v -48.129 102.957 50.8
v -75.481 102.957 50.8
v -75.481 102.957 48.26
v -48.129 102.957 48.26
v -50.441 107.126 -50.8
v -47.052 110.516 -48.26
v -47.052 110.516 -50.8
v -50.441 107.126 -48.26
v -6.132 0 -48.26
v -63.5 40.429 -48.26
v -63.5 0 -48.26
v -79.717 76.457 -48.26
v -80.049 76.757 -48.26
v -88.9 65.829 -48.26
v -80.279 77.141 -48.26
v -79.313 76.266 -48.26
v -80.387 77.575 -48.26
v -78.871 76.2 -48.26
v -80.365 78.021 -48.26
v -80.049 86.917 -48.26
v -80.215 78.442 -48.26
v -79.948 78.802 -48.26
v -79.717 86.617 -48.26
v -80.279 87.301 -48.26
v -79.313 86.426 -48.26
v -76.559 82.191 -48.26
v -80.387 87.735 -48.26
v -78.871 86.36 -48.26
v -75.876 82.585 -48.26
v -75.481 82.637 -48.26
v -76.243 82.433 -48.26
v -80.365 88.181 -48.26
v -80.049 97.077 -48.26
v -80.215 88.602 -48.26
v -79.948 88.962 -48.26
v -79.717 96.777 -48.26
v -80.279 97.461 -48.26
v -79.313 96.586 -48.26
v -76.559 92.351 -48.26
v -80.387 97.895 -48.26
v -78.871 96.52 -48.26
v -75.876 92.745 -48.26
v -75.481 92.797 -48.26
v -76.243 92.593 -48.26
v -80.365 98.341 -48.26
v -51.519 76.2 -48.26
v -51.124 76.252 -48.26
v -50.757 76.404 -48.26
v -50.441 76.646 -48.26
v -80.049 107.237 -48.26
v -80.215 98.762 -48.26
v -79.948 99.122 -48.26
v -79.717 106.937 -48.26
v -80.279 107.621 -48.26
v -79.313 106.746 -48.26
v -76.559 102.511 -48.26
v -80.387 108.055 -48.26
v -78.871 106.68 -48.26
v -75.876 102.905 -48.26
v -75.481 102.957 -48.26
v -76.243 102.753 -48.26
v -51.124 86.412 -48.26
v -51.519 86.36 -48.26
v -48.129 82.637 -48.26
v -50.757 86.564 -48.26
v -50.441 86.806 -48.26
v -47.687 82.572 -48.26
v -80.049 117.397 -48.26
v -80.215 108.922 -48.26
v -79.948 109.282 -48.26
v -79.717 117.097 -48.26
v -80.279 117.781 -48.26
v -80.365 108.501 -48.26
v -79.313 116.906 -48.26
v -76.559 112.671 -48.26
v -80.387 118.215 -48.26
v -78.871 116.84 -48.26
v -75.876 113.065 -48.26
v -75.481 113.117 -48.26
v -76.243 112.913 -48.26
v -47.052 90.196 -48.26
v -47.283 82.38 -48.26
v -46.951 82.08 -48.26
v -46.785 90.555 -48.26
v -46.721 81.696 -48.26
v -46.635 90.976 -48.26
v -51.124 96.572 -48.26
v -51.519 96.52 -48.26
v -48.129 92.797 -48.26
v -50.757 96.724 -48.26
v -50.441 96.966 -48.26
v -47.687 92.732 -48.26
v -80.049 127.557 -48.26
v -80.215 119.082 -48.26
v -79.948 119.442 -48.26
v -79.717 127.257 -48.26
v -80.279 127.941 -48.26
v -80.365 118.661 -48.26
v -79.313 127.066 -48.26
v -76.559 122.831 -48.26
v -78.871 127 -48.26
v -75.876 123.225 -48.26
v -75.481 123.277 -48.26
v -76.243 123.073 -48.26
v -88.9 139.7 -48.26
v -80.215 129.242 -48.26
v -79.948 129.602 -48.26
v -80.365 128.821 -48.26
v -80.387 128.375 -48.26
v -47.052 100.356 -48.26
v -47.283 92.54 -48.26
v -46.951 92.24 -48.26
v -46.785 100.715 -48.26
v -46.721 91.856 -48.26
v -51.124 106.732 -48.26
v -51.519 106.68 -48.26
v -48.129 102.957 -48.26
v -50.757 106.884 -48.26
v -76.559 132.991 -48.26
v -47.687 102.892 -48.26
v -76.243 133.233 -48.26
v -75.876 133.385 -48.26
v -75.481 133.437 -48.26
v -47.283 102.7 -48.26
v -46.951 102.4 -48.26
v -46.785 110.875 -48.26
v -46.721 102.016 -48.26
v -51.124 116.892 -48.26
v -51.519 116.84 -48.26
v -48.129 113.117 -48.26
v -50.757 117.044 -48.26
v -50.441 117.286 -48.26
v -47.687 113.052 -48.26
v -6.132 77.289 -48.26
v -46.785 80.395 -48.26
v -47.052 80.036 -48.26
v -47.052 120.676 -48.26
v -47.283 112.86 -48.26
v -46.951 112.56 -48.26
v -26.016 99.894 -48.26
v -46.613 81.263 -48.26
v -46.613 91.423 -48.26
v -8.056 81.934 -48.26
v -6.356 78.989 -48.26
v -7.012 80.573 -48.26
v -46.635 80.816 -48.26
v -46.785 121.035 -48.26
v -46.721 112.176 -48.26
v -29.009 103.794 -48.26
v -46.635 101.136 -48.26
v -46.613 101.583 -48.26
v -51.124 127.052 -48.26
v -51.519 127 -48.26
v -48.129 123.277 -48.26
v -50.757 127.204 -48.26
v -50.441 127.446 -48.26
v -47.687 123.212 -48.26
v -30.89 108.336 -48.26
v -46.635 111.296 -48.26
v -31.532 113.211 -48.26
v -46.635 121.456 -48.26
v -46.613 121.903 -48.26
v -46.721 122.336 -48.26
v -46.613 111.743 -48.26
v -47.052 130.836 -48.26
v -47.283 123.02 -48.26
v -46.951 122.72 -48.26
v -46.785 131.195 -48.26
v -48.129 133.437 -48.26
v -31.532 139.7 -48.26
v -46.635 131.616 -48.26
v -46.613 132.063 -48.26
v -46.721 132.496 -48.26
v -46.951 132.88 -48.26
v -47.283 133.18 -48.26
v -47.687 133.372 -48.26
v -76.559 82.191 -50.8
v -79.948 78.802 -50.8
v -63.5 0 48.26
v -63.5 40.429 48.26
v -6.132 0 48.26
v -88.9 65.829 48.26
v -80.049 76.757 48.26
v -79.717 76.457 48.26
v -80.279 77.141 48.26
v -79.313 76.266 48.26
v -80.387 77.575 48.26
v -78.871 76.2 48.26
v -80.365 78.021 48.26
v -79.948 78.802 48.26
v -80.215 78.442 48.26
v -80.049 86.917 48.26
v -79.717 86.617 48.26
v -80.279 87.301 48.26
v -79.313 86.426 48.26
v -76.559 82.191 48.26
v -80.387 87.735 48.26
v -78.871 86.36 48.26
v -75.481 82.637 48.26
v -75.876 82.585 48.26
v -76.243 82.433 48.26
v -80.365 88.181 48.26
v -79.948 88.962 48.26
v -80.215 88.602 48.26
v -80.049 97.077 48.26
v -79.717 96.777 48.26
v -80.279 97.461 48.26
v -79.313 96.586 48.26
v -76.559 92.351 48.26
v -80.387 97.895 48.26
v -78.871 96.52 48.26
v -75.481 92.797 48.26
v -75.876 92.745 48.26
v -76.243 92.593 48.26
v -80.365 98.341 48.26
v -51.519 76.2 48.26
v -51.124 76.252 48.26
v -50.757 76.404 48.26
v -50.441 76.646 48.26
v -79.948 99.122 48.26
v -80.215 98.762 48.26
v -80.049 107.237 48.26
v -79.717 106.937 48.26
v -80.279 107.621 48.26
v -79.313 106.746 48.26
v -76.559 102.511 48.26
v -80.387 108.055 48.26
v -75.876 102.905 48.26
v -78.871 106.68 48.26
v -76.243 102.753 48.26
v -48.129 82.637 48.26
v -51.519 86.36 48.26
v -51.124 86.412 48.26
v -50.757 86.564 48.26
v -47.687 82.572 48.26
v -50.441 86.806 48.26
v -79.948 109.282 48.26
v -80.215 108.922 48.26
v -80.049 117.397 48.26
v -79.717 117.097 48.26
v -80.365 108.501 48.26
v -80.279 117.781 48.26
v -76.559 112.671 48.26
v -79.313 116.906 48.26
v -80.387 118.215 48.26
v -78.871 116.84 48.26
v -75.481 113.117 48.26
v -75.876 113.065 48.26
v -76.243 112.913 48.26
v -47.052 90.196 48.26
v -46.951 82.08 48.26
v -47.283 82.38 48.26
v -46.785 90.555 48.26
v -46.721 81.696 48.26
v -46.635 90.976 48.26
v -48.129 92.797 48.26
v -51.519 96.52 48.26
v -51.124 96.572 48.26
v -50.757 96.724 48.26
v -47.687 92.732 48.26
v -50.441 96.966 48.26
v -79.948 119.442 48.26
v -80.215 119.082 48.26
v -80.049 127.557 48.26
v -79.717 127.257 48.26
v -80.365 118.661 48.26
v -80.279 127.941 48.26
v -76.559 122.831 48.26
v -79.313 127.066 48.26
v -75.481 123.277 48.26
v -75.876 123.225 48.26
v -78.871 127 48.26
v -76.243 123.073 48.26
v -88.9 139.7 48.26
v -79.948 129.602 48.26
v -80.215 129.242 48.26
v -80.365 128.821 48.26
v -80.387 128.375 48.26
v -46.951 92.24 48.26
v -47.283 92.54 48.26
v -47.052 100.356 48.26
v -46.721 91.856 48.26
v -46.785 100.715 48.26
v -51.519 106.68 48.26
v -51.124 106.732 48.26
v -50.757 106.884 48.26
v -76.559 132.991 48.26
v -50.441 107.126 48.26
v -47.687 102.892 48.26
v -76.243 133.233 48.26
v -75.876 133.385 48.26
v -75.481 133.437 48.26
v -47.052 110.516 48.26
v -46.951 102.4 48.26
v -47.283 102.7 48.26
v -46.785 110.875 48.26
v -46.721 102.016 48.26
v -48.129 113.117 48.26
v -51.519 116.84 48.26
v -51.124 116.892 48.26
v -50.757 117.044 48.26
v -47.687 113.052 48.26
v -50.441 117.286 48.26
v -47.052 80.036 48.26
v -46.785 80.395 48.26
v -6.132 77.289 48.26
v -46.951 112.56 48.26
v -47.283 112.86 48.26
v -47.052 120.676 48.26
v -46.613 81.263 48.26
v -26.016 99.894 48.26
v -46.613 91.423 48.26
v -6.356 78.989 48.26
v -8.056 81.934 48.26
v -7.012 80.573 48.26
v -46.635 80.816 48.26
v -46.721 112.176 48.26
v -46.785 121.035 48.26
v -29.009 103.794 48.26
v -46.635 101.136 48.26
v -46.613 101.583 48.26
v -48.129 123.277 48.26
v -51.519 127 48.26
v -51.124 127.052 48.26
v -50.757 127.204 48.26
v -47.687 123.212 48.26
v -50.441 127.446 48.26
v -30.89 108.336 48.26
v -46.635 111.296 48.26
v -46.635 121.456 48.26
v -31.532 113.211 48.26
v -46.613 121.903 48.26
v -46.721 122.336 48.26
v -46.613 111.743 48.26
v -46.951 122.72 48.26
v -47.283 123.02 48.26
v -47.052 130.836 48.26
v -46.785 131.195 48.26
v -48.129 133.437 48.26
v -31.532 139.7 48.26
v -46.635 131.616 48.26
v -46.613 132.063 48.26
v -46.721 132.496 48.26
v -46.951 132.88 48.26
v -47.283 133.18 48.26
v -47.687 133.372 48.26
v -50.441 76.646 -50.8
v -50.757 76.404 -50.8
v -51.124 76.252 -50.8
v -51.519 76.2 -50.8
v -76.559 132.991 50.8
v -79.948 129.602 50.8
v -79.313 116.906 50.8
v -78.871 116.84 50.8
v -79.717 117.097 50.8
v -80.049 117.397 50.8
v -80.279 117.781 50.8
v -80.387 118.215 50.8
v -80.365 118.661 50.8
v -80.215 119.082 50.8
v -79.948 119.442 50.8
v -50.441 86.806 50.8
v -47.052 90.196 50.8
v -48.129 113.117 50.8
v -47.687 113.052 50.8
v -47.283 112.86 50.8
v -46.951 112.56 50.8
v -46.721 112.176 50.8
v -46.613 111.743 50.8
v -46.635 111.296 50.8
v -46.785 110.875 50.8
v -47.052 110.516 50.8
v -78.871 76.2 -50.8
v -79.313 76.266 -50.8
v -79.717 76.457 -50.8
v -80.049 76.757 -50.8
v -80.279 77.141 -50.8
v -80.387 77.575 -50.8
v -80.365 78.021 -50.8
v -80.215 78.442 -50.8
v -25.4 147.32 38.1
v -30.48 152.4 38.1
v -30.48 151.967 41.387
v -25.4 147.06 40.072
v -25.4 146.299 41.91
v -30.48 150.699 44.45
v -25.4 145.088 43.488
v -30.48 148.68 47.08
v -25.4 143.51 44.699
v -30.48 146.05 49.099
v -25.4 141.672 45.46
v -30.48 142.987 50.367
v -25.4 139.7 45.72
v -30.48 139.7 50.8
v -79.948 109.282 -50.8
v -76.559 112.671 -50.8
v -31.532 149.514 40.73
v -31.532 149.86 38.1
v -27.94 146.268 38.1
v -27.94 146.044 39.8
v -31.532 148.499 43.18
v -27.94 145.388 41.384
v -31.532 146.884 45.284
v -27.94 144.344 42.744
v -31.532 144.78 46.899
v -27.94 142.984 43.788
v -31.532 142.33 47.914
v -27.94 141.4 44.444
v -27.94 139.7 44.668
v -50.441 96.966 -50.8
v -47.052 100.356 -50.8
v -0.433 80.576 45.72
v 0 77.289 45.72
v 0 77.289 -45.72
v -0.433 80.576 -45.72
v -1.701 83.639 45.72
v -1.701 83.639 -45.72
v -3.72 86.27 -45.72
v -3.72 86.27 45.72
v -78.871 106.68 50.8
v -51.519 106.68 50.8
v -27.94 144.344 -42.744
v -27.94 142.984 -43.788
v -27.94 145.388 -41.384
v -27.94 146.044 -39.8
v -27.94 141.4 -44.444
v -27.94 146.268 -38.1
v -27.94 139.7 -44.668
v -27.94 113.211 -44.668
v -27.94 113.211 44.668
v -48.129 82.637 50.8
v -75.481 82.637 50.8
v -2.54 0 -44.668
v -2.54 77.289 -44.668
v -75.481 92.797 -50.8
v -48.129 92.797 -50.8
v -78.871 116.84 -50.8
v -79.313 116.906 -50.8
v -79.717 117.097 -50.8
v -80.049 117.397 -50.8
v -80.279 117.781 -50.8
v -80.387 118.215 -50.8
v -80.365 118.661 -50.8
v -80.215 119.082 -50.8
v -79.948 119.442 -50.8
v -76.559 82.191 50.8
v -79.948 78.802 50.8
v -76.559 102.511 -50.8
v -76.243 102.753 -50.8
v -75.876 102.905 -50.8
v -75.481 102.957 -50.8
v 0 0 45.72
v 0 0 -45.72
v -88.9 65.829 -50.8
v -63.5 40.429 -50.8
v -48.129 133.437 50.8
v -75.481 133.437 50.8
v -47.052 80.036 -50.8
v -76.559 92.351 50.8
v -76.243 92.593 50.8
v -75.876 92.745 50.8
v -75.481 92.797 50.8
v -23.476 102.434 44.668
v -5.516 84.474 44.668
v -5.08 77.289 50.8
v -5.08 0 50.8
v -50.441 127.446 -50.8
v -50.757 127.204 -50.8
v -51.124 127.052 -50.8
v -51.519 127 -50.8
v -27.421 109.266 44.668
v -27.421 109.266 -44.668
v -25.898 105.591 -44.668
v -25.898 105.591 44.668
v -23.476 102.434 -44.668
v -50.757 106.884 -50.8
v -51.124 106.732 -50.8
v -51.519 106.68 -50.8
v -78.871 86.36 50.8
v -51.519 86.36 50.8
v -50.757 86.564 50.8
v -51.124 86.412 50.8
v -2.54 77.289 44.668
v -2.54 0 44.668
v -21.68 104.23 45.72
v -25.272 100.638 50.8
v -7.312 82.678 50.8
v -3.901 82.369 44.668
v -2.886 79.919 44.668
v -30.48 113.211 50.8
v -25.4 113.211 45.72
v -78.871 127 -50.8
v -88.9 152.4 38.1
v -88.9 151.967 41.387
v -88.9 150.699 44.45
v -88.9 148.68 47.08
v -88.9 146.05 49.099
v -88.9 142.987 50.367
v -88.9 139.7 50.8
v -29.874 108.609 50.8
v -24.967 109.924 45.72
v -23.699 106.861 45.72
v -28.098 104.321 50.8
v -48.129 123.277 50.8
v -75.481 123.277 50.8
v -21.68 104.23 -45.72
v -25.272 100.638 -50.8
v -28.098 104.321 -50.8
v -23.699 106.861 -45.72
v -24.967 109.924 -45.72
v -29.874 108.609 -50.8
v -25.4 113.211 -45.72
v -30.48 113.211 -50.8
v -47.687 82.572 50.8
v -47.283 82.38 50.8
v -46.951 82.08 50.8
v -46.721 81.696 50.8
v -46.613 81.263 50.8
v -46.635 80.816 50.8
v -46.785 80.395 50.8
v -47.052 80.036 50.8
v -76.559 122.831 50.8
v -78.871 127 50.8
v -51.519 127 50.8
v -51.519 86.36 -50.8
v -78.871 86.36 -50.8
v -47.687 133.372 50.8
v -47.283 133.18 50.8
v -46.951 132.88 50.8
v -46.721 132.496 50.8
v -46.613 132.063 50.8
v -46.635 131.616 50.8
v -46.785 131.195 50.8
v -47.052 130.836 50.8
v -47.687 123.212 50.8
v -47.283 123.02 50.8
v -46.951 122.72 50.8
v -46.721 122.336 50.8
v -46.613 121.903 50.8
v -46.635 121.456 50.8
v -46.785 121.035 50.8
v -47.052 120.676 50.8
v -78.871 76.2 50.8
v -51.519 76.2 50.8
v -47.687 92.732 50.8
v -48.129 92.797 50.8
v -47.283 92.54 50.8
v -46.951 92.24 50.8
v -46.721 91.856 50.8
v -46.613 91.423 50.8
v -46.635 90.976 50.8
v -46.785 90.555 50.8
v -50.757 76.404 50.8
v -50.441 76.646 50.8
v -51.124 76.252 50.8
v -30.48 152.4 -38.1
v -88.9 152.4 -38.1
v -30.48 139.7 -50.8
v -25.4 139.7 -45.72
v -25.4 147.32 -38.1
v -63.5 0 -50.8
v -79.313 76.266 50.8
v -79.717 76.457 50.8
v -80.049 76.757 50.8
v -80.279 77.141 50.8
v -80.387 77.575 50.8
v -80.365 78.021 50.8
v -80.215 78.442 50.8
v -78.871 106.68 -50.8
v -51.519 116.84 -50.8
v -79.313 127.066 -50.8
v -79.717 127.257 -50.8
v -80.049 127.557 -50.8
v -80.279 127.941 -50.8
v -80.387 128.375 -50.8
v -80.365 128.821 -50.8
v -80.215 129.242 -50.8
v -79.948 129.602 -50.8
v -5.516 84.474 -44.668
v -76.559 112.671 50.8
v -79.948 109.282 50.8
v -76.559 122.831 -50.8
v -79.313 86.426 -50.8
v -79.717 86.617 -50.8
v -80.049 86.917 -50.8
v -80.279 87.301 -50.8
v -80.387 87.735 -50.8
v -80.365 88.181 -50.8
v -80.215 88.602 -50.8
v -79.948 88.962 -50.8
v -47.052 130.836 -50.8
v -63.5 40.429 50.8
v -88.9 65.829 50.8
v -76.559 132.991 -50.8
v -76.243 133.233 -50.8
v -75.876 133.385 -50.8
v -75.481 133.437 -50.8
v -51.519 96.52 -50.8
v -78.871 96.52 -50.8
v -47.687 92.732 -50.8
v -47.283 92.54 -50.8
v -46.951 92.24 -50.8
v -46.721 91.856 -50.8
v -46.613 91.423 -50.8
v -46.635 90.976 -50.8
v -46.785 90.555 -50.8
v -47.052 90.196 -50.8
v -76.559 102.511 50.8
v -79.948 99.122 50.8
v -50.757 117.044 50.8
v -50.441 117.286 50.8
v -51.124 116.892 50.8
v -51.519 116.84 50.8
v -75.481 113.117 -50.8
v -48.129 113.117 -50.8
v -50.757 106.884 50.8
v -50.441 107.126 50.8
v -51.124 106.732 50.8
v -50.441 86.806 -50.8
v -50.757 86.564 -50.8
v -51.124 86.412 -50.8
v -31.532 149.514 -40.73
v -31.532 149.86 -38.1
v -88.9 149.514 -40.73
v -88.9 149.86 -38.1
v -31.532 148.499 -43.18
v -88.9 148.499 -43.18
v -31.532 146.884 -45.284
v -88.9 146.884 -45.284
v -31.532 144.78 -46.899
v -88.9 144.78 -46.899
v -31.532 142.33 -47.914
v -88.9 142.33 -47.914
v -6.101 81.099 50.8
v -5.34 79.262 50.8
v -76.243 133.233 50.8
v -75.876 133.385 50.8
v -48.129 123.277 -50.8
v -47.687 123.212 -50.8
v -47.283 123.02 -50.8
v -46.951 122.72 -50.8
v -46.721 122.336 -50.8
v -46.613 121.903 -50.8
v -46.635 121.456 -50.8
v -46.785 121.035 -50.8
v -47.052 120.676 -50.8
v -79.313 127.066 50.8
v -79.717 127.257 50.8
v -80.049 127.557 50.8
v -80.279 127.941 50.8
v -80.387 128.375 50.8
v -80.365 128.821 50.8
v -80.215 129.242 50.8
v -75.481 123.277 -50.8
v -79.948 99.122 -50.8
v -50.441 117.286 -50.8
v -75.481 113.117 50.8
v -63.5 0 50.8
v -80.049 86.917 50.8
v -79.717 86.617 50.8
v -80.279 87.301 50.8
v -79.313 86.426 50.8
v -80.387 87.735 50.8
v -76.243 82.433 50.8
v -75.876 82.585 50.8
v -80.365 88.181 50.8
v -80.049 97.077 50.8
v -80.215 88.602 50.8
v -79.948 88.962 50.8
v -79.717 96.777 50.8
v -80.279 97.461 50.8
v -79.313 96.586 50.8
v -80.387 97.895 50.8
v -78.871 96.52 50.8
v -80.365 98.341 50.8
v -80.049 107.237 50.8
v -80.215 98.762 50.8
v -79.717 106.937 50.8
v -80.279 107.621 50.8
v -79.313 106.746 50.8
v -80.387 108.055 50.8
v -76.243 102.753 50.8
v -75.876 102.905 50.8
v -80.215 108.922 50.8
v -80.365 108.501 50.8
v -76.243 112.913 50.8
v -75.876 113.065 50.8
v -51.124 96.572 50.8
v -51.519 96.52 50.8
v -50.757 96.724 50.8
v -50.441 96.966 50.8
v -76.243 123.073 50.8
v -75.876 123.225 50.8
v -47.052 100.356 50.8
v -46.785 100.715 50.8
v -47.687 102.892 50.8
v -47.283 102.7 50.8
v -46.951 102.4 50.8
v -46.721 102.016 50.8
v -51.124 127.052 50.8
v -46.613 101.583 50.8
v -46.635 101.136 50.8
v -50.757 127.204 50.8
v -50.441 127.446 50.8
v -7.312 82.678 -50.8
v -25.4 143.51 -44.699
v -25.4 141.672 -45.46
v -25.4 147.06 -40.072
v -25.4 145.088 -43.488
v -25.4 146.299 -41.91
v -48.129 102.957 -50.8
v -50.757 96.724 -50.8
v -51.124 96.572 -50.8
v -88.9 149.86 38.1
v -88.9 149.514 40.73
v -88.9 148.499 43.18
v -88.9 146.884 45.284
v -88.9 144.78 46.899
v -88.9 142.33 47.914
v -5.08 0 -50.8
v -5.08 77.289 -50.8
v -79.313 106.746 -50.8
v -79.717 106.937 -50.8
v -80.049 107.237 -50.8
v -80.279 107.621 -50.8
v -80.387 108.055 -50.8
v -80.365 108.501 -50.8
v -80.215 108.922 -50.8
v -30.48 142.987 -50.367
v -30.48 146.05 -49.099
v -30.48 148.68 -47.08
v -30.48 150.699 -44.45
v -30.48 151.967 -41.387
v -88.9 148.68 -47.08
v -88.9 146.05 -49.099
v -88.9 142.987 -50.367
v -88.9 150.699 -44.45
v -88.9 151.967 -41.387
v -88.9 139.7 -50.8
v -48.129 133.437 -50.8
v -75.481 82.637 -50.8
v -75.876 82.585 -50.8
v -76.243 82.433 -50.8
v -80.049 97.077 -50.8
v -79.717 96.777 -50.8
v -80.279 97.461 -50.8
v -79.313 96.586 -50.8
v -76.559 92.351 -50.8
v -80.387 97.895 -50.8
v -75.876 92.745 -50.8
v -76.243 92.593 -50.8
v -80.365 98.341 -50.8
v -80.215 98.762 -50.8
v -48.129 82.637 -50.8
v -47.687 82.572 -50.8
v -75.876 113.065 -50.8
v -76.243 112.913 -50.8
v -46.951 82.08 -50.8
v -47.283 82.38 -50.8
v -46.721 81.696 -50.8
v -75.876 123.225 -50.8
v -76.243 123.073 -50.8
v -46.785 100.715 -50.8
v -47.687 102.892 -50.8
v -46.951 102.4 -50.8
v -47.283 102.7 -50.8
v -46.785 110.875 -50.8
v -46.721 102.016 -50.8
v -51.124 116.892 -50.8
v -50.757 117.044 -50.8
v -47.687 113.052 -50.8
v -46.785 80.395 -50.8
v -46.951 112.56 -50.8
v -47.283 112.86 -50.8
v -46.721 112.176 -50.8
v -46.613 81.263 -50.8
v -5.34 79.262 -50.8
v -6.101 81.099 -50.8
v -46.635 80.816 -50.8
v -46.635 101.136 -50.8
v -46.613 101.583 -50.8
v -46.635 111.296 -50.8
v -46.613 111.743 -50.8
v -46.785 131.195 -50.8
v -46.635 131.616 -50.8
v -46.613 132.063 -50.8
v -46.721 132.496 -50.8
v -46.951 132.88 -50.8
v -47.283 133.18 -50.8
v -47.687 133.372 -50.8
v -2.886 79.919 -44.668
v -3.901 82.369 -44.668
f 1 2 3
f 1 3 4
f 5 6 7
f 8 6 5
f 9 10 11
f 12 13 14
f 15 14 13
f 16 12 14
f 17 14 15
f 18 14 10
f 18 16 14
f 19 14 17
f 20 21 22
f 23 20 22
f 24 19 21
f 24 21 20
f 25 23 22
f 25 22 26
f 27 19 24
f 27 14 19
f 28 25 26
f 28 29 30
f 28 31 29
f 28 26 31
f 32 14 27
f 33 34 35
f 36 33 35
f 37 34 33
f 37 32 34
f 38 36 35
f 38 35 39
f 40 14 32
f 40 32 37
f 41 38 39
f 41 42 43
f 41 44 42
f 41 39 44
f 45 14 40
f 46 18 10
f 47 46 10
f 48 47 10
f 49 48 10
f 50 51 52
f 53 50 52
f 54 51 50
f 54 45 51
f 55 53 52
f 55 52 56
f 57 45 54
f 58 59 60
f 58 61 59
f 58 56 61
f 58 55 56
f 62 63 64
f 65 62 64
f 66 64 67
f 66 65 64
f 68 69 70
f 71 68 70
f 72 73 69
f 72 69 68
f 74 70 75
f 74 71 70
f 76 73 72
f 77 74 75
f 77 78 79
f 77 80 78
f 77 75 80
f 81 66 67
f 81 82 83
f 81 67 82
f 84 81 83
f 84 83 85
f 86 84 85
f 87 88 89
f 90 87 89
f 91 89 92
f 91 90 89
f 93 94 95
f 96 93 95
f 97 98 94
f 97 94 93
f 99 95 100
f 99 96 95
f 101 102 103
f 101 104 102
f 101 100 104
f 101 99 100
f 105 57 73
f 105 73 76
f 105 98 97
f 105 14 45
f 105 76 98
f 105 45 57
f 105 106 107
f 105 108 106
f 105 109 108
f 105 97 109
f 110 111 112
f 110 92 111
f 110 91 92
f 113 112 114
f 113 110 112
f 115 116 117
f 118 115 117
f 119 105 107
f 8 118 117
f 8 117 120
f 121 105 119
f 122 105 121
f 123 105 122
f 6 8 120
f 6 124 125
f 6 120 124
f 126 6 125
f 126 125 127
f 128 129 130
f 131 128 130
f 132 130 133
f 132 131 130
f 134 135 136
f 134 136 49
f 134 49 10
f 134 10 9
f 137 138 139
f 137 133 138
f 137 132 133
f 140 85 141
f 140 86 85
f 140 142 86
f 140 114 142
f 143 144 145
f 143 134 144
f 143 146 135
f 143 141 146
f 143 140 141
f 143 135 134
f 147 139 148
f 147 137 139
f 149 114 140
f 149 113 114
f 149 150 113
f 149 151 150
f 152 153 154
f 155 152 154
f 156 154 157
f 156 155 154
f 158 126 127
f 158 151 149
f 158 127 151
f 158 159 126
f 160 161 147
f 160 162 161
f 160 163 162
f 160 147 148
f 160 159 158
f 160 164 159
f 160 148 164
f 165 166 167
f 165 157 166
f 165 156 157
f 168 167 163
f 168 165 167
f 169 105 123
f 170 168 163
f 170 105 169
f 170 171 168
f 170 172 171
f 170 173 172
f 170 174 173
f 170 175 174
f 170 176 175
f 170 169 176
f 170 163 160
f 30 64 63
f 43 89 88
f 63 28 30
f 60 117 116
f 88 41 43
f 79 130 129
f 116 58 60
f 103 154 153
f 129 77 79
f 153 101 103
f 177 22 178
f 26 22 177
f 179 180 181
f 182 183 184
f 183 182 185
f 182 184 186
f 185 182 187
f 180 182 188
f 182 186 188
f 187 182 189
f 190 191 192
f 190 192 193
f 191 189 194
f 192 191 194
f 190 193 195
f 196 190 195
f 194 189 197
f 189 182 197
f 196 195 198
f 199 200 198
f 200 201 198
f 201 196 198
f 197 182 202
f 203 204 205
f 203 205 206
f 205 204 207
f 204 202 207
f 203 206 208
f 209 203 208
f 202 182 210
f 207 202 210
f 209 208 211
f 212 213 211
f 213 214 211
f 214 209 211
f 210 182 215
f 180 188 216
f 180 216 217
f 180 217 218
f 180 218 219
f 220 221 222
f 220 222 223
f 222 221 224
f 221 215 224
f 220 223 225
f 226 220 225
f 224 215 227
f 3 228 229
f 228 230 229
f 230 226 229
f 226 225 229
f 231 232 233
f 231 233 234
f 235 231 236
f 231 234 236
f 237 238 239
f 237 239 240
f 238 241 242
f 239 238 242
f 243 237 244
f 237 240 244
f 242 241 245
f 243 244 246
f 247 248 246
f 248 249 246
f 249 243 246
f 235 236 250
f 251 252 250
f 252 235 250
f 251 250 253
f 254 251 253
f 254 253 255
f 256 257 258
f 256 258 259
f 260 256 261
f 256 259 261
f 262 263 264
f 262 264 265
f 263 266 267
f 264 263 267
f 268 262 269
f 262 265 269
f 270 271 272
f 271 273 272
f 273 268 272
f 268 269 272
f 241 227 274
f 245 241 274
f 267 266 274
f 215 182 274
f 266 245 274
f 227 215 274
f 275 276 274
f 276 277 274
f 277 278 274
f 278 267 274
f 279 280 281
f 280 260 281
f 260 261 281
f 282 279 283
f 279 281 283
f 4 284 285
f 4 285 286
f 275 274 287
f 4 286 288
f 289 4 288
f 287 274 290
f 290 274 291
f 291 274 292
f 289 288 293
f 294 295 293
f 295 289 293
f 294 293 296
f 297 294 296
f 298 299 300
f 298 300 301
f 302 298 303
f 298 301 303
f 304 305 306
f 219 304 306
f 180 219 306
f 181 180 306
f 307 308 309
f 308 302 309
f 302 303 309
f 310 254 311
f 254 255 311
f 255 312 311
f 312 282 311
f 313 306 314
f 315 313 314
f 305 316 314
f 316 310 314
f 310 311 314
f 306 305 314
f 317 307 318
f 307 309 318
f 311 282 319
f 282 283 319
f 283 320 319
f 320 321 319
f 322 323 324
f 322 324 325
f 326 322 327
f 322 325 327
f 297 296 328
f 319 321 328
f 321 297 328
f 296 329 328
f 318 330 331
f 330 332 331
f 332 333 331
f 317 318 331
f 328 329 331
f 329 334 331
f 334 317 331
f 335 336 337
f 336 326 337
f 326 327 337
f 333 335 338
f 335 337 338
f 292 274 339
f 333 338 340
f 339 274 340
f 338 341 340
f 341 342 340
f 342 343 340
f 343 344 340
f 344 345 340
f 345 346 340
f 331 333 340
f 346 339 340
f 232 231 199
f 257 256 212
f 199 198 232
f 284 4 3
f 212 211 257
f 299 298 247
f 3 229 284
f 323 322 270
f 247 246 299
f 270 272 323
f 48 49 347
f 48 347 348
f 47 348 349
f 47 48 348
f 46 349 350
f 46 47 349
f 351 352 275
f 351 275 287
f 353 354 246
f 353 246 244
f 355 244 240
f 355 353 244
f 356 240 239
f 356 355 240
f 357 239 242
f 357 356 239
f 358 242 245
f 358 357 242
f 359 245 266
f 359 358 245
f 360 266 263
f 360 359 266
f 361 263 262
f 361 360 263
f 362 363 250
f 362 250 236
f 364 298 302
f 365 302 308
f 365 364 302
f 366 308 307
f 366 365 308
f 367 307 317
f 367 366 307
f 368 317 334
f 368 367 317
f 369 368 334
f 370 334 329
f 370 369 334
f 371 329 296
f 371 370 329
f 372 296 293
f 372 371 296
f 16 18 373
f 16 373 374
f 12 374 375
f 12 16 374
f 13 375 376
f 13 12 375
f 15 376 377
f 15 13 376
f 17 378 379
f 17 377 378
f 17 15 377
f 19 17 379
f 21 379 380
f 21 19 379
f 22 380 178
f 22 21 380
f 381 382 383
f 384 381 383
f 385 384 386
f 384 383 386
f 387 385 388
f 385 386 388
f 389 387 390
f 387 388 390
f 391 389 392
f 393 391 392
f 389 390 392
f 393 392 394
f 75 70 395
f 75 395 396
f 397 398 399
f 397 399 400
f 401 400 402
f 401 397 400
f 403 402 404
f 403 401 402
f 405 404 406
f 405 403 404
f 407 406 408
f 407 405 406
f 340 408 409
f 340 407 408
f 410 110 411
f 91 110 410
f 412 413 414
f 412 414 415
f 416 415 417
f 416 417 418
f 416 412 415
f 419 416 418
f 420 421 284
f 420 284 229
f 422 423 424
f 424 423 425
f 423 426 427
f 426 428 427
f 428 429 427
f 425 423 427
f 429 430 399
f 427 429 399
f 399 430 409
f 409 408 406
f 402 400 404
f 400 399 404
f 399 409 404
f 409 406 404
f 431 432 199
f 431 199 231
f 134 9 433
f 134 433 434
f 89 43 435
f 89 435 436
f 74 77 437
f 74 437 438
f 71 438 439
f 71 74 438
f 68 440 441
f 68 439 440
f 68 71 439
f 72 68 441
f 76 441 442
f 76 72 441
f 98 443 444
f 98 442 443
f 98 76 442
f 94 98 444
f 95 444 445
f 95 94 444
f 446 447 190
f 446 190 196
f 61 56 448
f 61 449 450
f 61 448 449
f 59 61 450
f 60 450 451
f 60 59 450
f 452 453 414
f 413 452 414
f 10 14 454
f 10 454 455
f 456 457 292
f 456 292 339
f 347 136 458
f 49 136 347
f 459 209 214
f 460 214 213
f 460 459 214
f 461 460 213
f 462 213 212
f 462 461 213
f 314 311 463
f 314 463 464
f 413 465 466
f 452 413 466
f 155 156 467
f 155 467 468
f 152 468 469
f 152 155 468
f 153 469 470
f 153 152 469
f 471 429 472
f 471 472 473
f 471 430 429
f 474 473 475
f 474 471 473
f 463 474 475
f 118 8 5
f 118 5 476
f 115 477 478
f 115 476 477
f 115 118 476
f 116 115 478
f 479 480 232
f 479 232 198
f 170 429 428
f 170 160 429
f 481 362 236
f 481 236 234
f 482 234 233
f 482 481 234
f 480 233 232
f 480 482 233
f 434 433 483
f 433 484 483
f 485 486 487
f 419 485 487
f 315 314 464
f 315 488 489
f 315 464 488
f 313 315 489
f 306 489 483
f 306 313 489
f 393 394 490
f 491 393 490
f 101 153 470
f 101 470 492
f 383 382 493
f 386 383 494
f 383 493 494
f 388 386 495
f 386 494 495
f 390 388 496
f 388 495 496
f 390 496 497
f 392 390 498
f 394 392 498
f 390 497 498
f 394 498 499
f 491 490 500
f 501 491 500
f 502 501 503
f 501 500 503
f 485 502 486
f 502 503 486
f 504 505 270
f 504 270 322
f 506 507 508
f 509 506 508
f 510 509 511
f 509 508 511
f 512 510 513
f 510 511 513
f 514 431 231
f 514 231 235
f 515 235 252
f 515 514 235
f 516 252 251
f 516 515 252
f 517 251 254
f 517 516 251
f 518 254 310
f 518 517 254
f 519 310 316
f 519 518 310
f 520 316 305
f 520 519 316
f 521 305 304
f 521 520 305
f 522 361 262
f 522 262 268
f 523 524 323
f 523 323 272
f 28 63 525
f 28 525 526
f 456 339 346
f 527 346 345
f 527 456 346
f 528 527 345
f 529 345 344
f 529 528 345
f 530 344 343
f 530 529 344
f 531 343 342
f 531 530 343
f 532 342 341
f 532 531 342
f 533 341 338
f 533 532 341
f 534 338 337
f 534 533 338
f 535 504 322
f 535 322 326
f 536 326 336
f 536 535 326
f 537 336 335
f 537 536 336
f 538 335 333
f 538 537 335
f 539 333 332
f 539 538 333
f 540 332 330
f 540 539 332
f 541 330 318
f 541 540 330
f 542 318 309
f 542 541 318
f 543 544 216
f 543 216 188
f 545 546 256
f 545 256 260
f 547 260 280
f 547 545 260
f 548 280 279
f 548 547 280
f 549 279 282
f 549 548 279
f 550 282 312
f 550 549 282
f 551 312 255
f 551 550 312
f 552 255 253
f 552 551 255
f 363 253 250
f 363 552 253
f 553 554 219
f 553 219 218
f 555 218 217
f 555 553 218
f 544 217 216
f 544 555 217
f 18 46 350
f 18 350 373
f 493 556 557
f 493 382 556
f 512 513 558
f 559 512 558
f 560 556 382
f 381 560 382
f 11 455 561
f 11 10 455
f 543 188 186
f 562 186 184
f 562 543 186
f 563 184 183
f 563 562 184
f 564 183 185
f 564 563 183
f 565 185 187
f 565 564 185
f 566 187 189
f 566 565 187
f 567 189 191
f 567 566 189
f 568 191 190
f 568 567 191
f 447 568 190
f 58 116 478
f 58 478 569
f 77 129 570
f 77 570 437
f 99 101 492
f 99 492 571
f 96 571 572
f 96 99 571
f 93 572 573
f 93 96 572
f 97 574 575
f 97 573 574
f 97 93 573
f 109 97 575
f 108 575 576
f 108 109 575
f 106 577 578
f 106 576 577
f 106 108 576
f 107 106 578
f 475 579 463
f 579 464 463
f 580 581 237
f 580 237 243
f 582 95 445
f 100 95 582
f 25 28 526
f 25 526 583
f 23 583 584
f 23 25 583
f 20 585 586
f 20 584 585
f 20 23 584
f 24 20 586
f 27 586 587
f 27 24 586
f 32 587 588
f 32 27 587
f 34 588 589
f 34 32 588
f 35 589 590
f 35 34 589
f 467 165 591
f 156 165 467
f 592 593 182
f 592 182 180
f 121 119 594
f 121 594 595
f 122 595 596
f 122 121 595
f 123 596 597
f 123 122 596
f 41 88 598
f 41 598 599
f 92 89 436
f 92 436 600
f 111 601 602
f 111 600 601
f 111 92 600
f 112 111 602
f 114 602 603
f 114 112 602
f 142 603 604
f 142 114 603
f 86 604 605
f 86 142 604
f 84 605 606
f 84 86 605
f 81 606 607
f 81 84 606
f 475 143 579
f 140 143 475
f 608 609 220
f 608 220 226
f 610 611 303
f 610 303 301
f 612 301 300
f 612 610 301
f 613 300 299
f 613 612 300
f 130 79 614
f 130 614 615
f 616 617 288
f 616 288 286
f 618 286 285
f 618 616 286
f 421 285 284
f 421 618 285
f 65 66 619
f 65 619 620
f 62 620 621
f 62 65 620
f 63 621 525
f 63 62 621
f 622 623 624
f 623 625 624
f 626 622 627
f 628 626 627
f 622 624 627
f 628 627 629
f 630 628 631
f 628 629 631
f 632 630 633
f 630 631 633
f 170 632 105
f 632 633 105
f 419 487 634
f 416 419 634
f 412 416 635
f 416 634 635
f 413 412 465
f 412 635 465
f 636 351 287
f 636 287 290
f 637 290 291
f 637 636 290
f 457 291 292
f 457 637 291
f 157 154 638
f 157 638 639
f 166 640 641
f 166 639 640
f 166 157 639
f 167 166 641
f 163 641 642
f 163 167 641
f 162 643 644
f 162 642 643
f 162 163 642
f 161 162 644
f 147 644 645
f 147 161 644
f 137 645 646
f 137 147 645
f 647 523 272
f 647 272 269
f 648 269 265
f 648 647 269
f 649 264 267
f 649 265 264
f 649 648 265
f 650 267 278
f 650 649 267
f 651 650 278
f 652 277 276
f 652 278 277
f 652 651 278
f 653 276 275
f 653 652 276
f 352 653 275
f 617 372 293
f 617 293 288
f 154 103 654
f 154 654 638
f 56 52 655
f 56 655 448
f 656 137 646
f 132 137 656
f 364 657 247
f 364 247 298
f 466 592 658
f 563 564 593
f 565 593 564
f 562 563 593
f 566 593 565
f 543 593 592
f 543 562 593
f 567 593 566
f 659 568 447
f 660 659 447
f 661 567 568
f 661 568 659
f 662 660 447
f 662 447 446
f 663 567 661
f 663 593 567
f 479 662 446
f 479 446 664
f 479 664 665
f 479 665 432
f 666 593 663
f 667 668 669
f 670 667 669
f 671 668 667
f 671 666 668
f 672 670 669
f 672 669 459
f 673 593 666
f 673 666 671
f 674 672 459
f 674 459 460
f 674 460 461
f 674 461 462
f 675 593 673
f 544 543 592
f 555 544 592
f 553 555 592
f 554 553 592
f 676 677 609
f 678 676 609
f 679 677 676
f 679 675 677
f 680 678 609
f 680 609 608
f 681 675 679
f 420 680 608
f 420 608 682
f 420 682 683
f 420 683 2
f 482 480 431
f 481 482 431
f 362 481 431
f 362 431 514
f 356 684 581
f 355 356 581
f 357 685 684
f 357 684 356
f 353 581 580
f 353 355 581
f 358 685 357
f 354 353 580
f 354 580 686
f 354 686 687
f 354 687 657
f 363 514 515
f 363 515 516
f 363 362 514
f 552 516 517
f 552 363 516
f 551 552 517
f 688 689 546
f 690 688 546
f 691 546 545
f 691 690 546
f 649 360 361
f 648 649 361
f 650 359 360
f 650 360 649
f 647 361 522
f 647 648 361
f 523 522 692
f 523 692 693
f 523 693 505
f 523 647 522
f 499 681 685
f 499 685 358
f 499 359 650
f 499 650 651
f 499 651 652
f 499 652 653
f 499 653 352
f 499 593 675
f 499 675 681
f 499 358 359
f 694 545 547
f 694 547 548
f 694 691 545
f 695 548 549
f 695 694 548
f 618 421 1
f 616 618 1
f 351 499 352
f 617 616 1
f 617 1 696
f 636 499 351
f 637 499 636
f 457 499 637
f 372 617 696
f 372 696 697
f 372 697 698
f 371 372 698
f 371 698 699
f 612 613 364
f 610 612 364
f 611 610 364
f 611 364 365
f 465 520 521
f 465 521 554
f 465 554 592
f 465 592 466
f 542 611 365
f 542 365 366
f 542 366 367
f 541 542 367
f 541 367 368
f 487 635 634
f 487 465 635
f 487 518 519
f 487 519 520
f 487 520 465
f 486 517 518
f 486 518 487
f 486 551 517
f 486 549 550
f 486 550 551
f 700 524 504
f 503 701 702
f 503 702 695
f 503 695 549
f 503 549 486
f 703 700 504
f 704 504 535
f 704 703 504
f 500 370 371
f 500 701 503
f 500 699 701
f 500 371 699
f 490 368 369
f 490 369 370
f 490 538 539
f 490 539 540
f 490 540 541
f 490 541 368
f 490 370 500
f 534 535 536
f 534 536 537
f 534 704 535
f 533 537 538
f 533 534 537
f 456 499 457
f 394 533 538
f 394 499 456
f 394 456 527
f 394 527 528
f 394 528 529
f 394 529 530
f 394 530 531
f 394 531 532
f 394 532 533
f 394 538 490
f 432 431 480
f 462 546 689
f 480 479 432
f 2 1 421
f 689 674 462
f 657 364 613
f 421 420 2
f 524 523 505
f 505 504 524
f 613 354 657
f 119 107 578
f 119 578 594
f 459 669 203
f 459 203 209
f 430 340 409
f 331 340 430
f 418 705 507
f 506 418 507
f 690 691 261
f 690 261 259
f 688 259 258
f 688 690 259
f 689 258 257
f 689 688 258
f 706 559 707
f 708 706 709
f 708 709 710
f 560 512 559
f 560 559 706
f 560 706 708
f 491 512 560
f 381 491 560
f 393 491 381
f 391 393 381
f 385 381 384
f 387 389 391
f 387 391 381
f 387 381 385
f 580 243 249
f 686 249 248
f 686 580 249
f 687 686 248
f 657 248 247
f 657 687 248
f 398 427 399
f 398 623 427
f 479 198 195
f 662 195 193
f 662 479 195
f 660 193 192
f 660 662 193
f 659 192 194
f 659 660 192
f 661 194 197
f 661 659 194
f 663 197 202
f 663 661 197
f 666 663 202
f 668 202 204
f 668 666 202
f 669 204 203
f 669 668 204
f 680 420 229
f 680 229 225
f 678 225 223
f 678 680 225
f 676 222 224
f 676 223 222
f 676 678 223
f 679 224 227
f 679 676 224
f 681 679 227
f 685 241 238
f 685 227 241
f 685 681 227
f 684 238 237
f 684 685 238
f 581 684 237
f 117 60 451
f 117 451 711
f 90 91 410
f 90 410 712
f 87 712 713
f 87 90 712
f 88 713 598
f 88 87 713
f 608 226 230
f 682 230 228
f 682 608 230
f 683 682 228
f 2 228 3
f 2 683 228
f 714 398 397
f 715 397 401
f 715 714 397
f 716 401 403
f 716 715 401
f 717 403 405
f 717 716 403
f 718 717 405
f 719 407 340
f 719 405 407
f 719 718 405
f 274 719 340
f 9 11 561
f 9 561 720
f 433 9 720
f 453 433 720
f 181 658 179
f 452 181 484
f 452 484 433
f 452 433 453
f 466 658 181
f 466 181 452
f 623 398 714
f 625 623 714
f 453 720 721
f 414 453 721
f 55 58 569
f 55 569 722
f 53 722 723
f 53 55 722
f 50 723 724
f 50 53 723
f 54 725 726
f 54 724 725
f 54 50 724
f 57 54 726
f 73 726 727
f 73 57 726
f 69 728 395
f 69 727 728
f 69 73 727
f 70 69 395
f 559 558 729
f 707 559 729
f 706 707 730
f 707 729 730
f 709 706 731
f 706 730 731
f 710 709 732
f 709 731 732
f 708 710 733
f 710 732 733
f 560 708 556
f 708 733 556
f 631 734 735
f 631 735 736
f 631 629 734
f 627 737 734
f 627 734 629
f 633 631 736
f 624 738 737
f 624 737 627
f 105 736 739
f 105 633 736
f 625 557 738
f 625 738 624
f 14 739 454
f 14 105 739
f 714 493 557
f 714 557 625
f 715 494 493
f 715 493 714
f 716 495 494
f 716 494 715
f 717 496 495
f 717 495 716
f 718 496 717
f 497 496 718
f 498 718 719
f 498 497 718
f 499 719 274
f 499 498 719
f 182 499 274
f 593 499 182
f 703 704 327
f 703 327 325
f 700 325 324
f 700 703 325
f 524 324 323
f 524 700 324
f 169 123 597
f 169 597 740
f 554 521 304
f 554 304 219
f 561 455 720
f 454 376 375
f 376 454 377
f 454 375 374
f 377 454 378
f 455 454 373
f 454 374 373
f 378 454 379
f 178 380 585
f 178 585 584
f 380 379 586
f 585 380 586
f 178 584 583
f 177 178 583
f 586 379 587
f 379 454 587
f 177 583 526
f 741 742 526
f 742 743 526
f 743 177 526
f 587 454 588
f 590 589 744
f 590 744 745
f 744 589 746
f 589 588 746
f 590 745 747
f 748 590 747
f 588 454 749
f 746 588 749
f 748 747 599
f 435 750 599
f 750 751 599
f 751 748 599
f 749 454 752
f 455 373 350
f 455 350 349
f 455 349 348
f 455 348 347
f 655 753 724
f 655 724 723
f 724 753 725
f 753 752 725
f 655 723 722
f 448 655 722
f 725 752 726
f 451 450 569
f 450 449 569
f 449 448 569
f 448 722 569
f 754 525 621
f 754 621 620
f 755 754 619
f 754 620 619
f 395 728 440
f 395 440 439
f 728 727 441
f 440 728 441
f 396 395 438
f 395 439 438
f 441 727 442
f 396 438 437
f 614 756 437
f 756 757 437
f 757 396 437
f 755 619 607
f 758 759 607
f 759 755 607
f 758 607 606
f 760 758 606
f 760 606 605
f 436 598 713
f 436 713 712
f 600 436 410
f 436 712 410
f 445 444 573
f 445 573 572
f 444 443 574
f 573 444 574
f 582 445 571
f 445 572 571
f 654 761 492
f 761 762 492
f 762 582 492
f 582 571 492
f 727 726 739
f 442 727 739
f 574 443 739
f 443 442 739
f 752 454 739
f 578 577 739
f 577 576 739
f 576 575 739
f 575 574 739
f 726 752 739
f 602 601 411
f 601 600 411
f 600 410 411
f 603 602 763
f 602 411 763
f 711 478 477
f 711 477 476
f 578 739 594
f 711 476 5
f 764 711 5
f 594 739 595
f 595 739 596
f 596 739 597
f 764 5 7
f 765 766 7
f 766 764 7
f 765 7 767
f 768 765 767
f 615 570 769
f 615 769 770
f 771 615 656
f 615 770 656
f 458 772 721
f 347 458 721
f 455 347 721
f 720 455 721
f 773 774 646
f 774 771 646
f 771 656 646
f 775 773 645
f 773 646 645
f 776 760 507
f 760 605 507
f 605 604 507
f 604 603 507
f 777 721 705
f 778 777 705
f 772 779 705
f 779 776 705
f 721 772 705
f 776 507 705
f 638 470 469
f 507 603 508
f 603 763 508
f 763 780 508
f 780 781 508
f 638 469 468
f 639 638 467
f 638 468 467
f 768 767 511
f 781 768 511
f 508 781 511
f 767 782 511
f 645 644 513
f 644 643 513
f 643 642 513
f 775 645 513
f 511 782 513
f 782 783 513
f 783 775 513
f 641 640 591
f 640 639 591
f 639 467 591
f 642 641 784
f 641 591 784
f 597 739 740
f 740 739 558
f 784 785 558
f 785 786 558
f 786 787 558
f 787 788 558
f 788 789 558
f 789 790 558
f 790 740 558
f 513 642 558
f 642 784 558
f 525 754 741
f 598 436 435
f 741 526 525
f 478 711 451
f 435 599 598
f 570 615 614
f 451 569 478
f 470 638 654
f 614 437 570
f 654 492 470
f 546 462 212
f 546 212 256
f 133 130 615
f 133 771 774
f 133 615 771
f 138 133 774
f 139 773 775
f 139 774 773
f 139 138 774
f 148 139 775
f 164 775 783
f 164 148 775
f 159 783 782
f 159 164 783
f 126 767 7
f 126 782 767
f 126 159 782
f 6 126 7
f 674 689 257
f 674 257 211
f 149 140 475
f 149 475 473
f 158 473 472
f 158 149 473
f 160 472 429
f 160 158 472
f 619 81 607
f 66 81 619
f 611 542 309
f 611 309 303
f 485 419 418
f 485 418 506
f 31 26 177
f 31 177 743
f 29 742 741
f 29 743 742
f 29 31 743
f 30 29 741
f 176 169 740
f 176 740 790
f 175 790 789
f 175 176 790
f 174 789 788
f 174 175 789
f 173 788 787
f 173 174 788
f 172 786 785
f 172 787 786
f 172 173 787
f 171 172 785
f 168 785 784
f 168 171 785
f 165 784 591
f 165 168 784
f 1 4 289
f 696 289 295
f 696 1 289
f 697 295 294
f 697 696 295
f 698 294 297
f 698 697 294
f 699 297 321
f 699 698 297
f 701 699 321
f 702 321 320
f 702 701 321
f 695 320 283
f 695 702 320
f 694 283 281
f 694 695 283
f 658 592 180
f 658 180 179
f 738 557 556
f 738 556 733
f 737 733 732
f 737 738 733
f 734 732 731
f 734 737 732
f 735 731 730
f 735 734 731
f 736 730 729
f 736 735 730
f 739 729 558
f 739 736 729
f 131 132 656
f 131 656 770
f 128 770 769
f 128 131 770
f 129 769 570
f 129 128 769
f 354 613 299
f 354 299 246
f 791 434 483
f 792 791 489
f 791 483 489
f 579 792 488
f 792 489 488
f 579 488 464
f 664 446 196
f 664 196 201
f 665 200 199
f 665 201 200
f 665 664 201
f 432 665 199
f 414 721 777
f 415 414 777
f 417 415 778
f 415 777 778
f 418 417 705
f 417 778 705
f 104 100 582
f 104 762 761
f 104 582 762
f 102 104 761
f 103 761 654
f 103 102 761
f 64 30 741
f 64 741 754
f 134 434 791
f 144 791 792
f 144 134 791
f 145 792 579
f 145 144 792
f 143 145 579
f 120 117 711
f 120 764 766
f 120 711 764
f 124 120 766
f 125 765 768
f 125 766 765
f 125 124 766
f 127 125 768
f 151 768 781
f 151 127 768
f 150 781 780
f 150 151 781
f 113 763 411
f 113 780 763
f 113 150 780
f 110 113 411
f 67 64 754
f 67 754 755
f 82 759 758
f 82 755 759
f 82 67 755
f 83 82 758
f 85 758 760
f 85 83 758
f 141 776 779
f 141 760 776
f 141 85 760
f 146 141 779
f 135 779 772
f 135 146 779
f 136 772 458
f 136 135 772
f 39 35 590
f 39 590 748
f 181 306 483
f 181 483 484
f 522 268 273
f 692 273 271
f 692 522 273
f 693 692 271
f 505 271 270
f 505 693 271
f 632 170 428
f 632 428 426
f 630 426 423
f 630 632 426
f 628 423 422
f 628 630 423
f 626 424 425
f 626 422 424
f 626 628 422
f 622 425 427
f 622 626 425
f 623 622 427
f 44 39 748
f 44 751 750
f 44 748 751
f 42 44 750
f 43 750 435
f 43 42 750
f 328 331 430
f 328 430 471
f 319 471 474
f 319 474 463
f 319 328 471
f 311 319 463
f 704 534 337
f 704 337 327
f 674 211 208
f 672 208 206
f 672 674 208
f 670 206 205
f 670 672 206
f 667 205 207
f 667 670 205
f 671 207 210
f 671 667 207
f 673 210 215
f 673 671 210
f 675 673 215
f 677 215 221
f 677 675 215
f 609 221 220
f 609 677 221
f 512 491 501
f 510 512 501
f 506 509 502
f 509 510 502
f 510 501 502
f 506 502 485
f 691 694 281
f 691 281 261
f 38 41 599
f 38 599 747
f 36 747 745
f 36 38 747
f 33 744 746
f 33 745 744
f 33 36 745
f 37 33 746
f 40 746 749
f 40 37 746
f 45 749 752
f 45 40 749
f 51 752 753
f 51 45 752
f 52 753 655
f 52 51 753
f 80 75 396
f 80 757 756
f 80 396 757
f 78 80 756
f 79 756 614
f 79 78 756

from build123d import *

# Parameters (mm, degrees)
BOSS_EXTRUDE1_DEPTH = 50.8
FILLET2_R           = 12.7
CHAMFER1_SIZE       = 5.08
SHELL1_T            = -2.54
CUT_EXTRUDE1_DEPTH  = 204.596488182


with BuildPart() as part:
    # Sketch1 → Boss-Extrude1 (new, symmetric)
    with BuildSketch(Plane.XY):
        Polygon((0, 0), (0, 82.55), (-25.4, 107.95), (-25.4, 152.4), (-88.9, 152.4), (-88.9, 65.828865162), (-63.5, 40.428865162), (-63.5, 0), align=None)
    extrude(amount=BOSS_EXTRUDE1_DEPTH, both=True)

    # Fillet2
    fillet2_edges = [part.edges().sort_by_distance(p)[0] for p in [
        (-25.4, 107.95, 0),
        (0, 82.55, 0),
        (-57.15, 152.4, 50.8),
        (-57.15, 152.4, -50.8),
    ]]
    fillet(fillet2_edges, radius=FILLET2_R)

    # Chamfer1
    chamfer1_edges = [part.edges().sort_by_distance(p)[0] for p in [
        (0, 38.644743879, -50.8),
        (-12.7, 95.25, -50.8),
        (-12.7, 95.25, 50.8),
        (-25.4, 126.455256121, -50.8),
        (-0.966729937, 82.149567349, -50.8),
        (-25.4, 126.455256121, 50.8),
        (-0.966729937, 82.149567349, 50.8),
        (-25.4, 152.4, 0),
        (-25.4, 148.680256121, 47.080256121),
        (-25.4, 148.680256121, -47.080256121),
        (-24.433270063, 108.350432651, -50.8),
        (-24.433270063, 108.350432651, 50.8),
        (0, 38.644743879, 50.8),
    ]]
    chamfer(chamfer1_edges, length=CHAMFER1_SIZE)

    # Shell1
    shell1_openings = [part.faces().sort_by_distance(p)[0] for p in [
        (-63.5, 20.214432581, 0),
        (-76.2, 53.128865162, 0),
        (-88.9, 108.793553587, 0),
        (-31.870709505, 0, 0),
    ]]
    offset(amount=SHELL1_T, openings=shell1_openings, kind=Kind.INTERSECTION)

    # Sketch2 → Cut-Extrude1 (cut, through all)
    with BuildSketch(Plane.XY.offset(50.8)):
        with BuildLine():
            Line((-75.481467356, 133.437271175), (-48.129261469, 133.437271175))
            ThreePointArc((-48.129261469, 133.437271175), (-46.721269062, 132.496480726), (-47.051630735, 130.835640441))
            Line((-47.051630735, 130.835640441), (-50.44090191, 127.446369265))
            ThreePointArc((-50.44090191, 127.446369265), (-50.935323093, 127.116007592), (-51.518532644, 127))
            Line((-51.518532644, 127), (-78.870738531, 127))
            ThreePointArc((-78.870738531, 127), (-80.278730938, 127.940790449), (-79.948369265, 129.601630735))
            Line((-79.948369265, 129.601630735), (-76.55909809, 132.99090191))
            ThreePointArc((-76.55909809, 132.99090191), (-76.064676907, 133.321263583), (-75.481467356, 133.437271175))
        make_face()
        with BuildLine():
            Line((-75.481467356, 123.277271175), (-48.129261469, 123.277271175))
            ThreePointArc((-48.129261469, 123.277271175), (-46.721269062, 122.336480726), (-47.051630735, 120.675640441))
            Line((-47.051630735, 120.675640441), (-50.44090191, 117.286369265))
            ThreePointArc((-50.44090191, 117.286369265), (-50.935323093, 116.956007592), (-51.518532644, 116.84))
            Line((-51.518532644, 116.84), (-78.870738531, 116.84))
            ThreePointArc((-78.870738531, 116.84), (-80.278730938, 117.780790449), (-79.948369265, 119.441630735))
            Line((-79.948369265, 119.441630735), (-76.55909809, 122.83090191))
            ThreePointArc((-76.55909809, 122.83090191), (-76.064676907, 123.161263583), (-75.481467356, 123.277271175))
        make_face()
        with BuildLine():
            Line((-75.481467356, 113.117271175), (-48.129261469, 113.117271175))
            ThreePointArc((-48.129261469, 113.117271175), (-46.721269062, 112.176480726), (-47.051630735, 110.515640441))
            Line((-47.051630735, 110.515640441), (-50.44090191, 107.126369265))
            ThreePointArc((-50.44090191, 107.126369265), (-50.935323093, 106.796007592), (-51.518532644, 106.68))
            Line((-51.518532644, 106.68), (-78.870738531, 106.68))
            ThreePointArc((-78.870738531, 106.68), (-80.278730938, 107.620790449), (-79.948369265, 109.281630735))
            Line((-79.948369265, 109.281630735), (-76.55909809, 112.67090191))
            ThreePointArc((-76.55909809, 112.67090191), (-76.064676907, 113.001263583), (-75.481467356, 113.117271175))
        make_face()
        with BuildLine():
            Line((-75.481467356, 102.957271175), (-48.129261469, 102.957271175))
            ThreePointArc((-48.129261469, 102.957271175), (-46.721269062, 102.016480726), (-47.051630735, 100.355640441))
            Line((-47.051630735, 100.355640441), (-50.44090191, 96.966369265))
            ThreePointArc((-50.44090191, 96.966369265), (-50.935323093, 96.636007592), (-51.518532644, 96.52))
            Line((-51.518532644, 96.52), (-78.870738531, 96.52))
            ThreePointArc((-78.870738531, 96.52), (-80.278730938, 97.460790449), (-79.948369265, 99.121630735))
            Line((-79.948369265, 99.121630735), (-76.55909809, 102.51090191))
            ThreePointArc((-76.55909809, 102.51090191), (-76.064676907, 102.841263583), (-75.481467356, 102.957271175))
        make_face()
        with BuildLine():
            Line((-75.481467356, 92.797271175), (-48.129261469, 92.797271175))
            ThreePointArc((-48.129261469, 92.797271175), (-46.721269062, 91.856480726), (-47.051630735, 90.195640441))
            Line((-47.051630735, 90.195640441), (-50.44090191, 86.806369265))
            ThreePointArc((-50.44090191, 86.806369265), (-50.935323093, 86.476007592), (-51.518532644, 86.36))
            Line((-51.518532644, 86.36), (-78.870738531, 86.36))
            ThreePointArc((-78.870738531, 86.36), (-80.278730938, 87.300790449), (-79.948369265, 88.961630735))
            Line((-79.948369265, 88.961630735), (-76.55909809, 92.35090191))
            ThreePointArc((-76.55909809, 92.35090191), (-76.064676907, 92.681263583), (-75.481467356, 92.797271175))
        make_face()
        with BuildLine():
            Line((-75.481467356, 82.637271175), (-48.129261469, 82.637271175))
            ThreePointArc((-48.129261469, 82.637271175), (-46.721269062, 81.696480726), (-47.051630735, 80.035640441))
            Line((-47.051630735, 80.035640441), (-50.44090191, 76.646369265))
            ThreePointArc((-50.44090191, 76.646369265), (-50.935323093, 76.316007592), (-51.518532644, 76.2))
            Line((-51.518532644, 76.2), (-78.870738531, 76.2))
            ThreePointArc((-78.870738531, 76.2), (-80.278730938, 77.140790449), (-79.948369265, 78.801630735))
            Line((-79.948369265, 78.801630735), (-76.55909809, 82.19090191))
            ThreePointArc((-76.55909809, 82.19090191), (-76.064676907, 82.521263583), (-75.481467356, 82.637271175))
        make_face()
    extrude(amount=-CUT_EXTRUDE1_DEPTH, mode=Mode.SUBTRACT)


solid = part.part
